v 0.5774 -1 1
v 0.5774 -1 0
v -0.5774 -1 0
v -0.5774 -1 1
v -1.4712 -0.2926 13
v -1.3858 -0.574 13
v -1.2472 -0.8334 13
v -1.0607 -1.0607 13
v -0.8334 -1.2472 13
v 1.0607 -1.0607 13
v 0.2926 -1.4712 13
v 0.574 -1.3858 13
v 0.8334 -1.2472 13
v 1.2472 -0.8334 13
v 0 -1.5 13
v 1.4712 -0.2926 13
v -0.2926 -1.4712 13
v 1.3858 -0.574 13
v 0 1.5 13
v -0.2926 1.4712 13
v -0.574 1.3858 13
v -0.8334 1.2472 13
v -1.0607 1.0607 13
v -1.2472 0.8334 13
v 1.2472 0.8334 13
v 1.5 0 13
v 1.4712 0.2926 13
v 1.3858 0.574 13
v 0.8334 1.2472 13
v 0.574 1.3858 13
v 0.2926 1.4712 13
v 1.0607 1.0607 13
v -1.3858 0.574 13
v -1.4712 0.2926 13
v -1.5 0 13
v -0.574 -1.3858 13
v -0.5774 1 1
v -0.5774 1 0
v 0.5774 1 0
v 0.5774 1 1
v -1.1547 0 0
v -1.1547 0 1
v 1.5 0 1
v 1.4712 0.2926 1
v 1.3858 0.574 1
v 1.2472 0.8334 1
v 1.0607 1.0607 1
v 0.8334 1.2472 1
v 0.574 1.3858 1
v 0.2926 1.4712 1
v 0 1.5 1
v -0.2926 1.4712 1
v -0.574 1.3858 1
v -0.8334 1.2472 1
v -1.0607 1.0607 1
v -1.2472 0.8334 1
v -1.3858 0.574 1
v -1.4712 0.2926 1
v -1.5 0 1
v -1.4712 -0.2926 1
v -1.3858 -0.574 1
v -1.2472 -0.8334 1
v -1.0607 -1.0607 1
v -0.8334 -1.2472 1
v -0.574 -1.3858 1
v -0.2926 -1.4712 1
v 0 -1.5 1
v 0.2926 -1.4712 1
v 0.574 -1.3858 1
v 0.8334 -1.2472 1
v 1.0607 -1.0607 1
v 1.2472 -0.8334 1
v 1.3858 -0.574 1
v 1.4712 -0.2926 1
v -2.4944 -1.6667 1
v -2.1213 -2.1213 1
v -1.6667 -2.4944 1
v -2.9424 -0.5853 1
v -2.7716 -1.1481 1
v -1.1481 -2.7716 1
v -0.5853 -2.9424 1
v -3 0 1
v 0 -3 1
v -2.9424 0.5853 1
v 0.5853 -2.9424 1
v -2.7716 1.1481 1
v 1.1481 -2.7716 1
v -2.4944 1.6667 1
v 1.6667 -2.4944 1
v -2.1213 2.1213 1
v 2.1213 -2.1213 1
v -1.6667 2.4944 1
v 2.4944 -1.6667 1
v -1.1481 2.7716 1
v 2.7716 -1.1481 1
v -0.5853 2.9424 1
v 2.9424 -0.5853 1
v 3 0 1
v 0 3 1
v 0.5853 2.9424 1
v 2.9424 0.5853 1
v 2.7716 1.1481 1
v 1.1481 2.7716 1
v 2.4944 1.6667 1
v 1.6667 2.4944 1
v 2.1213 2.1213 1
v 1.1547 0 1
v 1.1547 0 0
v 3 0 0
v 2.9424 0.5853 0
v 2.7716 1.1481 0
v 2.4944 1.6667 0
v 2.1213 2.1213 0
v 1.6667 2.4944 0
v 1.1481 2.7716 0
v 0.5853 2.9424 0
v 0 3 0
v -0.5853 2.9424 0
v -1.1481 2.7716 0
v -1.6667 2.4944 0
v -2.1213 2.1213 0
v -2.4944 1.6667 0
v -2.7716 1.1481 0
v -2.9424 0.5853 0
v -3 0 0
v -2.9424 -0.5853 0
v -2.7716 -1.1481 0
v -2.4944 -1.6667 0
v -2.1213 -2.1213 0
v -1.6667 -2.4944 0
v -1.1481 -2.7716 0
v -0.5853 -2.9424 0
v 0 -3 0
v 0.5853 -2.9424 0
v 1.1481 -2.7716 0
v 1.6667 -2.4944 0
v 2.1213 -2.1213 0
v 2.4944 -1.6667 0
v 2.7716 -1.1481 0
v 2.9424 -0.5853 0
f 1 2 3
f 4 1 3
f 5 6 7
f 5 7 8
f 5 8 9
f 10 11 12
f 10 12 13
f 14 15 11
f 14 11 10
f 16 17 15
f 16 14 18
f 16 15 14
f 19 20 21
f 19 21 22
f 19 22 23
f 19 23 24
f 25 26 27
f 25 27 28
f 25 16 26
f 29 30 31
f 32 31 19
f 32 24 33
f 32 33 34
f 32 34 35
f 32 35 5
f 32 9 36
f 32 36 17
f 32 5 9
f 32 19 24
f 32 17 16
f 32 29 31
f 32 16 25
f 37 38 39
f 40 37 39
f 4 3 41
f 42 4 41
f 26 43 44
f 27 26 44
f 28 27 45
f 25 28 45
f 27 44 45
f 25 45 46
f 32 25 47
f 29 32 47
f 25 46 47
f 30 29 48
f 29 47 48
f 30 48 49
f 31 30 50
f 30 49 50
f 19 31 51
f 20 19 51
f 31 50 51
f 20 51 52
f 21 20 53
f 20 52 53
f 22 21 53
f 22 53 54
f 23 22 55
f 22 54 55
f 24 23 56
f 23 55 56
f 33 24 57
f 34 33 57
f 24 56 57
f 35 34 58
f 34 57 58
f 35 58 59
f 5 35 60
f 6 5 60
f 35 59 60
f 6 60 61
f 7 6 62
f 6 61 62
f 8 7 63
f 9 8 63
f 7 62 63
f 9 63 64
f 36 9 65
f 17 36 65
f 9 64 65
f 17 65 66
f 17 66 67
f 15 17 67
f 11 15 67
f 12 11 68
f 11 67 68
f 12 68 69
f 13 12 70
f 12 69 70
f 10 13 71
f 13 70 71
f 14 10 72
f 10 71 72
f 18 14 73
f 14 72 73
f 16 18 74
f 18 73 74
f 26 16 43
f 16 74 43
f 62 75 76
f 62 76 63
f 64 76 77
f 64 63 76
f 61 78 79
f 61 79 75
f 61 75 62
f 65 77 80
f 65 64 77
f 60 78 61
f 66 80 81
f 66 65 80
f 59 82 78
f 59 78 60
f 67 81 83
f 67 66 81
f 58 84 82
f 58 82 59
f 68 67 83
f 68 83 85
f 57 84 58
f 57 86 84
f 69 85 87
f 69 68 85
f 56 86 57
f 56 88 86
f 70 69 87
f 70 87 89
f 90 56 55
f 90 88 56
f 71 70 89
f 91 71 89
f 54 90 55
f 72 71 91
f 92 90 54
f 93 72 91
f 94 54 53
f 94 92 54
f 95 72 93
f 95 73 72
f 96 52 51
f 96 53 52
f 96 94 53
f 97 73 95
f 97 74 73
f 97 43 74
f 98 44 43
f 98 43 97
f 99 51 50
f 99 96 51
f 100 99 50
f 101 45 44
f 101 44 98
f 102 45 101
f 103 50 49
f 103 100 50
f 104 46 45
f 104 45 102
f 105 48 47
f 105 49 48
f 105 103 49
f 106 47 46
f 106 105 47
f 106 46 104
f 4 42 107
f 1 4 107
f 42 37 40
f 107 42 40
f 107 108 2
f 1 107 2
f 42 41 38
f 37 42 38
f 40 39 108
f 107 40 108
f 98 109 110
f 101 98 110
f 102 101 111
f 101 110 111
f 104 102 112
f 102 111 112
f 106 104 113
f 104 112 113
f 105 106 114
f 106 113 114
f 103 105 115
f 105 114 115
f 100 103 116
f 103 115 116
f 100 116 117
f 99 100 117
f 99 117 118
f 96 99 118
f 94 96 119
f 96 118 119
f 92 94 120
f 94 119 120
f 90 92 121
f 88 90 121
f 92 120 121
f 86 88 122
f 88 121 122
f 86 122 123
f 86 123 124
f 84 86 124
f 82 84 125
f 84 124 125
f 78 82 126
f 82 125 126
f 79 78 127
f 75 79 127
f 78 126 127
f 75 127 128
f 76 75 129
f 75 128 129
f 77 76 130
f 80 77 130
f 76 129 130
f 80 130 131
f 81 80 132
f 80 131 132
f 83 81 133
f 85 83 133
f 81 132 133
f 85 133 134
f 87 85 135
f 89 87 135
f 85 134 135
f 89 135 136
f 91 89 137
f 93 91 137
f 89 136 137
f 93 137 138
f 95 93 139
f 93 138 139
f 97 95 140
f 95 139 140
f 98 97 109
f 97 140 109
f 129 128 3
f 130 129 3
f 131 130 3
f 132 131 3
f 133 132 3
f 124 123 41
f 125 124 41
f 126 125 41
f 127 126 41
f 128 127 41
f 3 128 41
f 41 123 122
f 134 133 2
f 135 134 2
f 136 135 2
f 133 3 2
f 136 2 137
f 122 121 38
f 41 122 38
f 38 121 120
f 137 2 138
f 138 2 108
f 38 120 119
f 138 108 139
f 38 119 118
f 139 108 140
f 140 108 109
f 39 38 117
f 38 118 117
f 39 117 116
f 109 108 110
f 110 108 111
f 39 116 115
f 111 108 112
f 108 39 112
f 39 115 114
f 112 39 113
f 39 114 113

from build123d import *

# Parameters (mm, degrees)
SKETCH_1_R          = 3
EXTRUDE_1_DEPTH     = 1
CUT_EXTRUDE_1_DEPTH = 1
SKETCH_3_R          = 1.5
EXTRUDE_2_DEPTH     = 12


with BuildPart() as part:
    # 草图1 → 凸台-拉伸1 (new body)
    with BuildSketch(Plane.XY):
        Circle(SKETCH_1_R)
    extrude(amount=EXTRUDE_1_DEPTH)

    # 草图2 → 切除-拉伸1 (cut)
    with BuildSketch(Plane(origin=(0, 0, 0), x_dir=(-1, 0, 0), z_dir=(0, 0, -1))):
        Polygon((1.154700538, 0), (0.577350269, 1), (-0.577350269, 1), (-1.154700538, 0), (-0.577350269, -1), (0.577350269, -1), align=None)
    extrude(amount=-CUT_EXTRUDE_1_DEPTH, mode=Mode.SUBTRACT)

    # 草图3 → 凸台-拉伸2 (add)
    with BuildSketch(Plane.XY.offset(1)):
        Circle(SKETCH_3_R)
    extrude(amount=EXTRUDE_2_DEPTH)


solid = part.part
